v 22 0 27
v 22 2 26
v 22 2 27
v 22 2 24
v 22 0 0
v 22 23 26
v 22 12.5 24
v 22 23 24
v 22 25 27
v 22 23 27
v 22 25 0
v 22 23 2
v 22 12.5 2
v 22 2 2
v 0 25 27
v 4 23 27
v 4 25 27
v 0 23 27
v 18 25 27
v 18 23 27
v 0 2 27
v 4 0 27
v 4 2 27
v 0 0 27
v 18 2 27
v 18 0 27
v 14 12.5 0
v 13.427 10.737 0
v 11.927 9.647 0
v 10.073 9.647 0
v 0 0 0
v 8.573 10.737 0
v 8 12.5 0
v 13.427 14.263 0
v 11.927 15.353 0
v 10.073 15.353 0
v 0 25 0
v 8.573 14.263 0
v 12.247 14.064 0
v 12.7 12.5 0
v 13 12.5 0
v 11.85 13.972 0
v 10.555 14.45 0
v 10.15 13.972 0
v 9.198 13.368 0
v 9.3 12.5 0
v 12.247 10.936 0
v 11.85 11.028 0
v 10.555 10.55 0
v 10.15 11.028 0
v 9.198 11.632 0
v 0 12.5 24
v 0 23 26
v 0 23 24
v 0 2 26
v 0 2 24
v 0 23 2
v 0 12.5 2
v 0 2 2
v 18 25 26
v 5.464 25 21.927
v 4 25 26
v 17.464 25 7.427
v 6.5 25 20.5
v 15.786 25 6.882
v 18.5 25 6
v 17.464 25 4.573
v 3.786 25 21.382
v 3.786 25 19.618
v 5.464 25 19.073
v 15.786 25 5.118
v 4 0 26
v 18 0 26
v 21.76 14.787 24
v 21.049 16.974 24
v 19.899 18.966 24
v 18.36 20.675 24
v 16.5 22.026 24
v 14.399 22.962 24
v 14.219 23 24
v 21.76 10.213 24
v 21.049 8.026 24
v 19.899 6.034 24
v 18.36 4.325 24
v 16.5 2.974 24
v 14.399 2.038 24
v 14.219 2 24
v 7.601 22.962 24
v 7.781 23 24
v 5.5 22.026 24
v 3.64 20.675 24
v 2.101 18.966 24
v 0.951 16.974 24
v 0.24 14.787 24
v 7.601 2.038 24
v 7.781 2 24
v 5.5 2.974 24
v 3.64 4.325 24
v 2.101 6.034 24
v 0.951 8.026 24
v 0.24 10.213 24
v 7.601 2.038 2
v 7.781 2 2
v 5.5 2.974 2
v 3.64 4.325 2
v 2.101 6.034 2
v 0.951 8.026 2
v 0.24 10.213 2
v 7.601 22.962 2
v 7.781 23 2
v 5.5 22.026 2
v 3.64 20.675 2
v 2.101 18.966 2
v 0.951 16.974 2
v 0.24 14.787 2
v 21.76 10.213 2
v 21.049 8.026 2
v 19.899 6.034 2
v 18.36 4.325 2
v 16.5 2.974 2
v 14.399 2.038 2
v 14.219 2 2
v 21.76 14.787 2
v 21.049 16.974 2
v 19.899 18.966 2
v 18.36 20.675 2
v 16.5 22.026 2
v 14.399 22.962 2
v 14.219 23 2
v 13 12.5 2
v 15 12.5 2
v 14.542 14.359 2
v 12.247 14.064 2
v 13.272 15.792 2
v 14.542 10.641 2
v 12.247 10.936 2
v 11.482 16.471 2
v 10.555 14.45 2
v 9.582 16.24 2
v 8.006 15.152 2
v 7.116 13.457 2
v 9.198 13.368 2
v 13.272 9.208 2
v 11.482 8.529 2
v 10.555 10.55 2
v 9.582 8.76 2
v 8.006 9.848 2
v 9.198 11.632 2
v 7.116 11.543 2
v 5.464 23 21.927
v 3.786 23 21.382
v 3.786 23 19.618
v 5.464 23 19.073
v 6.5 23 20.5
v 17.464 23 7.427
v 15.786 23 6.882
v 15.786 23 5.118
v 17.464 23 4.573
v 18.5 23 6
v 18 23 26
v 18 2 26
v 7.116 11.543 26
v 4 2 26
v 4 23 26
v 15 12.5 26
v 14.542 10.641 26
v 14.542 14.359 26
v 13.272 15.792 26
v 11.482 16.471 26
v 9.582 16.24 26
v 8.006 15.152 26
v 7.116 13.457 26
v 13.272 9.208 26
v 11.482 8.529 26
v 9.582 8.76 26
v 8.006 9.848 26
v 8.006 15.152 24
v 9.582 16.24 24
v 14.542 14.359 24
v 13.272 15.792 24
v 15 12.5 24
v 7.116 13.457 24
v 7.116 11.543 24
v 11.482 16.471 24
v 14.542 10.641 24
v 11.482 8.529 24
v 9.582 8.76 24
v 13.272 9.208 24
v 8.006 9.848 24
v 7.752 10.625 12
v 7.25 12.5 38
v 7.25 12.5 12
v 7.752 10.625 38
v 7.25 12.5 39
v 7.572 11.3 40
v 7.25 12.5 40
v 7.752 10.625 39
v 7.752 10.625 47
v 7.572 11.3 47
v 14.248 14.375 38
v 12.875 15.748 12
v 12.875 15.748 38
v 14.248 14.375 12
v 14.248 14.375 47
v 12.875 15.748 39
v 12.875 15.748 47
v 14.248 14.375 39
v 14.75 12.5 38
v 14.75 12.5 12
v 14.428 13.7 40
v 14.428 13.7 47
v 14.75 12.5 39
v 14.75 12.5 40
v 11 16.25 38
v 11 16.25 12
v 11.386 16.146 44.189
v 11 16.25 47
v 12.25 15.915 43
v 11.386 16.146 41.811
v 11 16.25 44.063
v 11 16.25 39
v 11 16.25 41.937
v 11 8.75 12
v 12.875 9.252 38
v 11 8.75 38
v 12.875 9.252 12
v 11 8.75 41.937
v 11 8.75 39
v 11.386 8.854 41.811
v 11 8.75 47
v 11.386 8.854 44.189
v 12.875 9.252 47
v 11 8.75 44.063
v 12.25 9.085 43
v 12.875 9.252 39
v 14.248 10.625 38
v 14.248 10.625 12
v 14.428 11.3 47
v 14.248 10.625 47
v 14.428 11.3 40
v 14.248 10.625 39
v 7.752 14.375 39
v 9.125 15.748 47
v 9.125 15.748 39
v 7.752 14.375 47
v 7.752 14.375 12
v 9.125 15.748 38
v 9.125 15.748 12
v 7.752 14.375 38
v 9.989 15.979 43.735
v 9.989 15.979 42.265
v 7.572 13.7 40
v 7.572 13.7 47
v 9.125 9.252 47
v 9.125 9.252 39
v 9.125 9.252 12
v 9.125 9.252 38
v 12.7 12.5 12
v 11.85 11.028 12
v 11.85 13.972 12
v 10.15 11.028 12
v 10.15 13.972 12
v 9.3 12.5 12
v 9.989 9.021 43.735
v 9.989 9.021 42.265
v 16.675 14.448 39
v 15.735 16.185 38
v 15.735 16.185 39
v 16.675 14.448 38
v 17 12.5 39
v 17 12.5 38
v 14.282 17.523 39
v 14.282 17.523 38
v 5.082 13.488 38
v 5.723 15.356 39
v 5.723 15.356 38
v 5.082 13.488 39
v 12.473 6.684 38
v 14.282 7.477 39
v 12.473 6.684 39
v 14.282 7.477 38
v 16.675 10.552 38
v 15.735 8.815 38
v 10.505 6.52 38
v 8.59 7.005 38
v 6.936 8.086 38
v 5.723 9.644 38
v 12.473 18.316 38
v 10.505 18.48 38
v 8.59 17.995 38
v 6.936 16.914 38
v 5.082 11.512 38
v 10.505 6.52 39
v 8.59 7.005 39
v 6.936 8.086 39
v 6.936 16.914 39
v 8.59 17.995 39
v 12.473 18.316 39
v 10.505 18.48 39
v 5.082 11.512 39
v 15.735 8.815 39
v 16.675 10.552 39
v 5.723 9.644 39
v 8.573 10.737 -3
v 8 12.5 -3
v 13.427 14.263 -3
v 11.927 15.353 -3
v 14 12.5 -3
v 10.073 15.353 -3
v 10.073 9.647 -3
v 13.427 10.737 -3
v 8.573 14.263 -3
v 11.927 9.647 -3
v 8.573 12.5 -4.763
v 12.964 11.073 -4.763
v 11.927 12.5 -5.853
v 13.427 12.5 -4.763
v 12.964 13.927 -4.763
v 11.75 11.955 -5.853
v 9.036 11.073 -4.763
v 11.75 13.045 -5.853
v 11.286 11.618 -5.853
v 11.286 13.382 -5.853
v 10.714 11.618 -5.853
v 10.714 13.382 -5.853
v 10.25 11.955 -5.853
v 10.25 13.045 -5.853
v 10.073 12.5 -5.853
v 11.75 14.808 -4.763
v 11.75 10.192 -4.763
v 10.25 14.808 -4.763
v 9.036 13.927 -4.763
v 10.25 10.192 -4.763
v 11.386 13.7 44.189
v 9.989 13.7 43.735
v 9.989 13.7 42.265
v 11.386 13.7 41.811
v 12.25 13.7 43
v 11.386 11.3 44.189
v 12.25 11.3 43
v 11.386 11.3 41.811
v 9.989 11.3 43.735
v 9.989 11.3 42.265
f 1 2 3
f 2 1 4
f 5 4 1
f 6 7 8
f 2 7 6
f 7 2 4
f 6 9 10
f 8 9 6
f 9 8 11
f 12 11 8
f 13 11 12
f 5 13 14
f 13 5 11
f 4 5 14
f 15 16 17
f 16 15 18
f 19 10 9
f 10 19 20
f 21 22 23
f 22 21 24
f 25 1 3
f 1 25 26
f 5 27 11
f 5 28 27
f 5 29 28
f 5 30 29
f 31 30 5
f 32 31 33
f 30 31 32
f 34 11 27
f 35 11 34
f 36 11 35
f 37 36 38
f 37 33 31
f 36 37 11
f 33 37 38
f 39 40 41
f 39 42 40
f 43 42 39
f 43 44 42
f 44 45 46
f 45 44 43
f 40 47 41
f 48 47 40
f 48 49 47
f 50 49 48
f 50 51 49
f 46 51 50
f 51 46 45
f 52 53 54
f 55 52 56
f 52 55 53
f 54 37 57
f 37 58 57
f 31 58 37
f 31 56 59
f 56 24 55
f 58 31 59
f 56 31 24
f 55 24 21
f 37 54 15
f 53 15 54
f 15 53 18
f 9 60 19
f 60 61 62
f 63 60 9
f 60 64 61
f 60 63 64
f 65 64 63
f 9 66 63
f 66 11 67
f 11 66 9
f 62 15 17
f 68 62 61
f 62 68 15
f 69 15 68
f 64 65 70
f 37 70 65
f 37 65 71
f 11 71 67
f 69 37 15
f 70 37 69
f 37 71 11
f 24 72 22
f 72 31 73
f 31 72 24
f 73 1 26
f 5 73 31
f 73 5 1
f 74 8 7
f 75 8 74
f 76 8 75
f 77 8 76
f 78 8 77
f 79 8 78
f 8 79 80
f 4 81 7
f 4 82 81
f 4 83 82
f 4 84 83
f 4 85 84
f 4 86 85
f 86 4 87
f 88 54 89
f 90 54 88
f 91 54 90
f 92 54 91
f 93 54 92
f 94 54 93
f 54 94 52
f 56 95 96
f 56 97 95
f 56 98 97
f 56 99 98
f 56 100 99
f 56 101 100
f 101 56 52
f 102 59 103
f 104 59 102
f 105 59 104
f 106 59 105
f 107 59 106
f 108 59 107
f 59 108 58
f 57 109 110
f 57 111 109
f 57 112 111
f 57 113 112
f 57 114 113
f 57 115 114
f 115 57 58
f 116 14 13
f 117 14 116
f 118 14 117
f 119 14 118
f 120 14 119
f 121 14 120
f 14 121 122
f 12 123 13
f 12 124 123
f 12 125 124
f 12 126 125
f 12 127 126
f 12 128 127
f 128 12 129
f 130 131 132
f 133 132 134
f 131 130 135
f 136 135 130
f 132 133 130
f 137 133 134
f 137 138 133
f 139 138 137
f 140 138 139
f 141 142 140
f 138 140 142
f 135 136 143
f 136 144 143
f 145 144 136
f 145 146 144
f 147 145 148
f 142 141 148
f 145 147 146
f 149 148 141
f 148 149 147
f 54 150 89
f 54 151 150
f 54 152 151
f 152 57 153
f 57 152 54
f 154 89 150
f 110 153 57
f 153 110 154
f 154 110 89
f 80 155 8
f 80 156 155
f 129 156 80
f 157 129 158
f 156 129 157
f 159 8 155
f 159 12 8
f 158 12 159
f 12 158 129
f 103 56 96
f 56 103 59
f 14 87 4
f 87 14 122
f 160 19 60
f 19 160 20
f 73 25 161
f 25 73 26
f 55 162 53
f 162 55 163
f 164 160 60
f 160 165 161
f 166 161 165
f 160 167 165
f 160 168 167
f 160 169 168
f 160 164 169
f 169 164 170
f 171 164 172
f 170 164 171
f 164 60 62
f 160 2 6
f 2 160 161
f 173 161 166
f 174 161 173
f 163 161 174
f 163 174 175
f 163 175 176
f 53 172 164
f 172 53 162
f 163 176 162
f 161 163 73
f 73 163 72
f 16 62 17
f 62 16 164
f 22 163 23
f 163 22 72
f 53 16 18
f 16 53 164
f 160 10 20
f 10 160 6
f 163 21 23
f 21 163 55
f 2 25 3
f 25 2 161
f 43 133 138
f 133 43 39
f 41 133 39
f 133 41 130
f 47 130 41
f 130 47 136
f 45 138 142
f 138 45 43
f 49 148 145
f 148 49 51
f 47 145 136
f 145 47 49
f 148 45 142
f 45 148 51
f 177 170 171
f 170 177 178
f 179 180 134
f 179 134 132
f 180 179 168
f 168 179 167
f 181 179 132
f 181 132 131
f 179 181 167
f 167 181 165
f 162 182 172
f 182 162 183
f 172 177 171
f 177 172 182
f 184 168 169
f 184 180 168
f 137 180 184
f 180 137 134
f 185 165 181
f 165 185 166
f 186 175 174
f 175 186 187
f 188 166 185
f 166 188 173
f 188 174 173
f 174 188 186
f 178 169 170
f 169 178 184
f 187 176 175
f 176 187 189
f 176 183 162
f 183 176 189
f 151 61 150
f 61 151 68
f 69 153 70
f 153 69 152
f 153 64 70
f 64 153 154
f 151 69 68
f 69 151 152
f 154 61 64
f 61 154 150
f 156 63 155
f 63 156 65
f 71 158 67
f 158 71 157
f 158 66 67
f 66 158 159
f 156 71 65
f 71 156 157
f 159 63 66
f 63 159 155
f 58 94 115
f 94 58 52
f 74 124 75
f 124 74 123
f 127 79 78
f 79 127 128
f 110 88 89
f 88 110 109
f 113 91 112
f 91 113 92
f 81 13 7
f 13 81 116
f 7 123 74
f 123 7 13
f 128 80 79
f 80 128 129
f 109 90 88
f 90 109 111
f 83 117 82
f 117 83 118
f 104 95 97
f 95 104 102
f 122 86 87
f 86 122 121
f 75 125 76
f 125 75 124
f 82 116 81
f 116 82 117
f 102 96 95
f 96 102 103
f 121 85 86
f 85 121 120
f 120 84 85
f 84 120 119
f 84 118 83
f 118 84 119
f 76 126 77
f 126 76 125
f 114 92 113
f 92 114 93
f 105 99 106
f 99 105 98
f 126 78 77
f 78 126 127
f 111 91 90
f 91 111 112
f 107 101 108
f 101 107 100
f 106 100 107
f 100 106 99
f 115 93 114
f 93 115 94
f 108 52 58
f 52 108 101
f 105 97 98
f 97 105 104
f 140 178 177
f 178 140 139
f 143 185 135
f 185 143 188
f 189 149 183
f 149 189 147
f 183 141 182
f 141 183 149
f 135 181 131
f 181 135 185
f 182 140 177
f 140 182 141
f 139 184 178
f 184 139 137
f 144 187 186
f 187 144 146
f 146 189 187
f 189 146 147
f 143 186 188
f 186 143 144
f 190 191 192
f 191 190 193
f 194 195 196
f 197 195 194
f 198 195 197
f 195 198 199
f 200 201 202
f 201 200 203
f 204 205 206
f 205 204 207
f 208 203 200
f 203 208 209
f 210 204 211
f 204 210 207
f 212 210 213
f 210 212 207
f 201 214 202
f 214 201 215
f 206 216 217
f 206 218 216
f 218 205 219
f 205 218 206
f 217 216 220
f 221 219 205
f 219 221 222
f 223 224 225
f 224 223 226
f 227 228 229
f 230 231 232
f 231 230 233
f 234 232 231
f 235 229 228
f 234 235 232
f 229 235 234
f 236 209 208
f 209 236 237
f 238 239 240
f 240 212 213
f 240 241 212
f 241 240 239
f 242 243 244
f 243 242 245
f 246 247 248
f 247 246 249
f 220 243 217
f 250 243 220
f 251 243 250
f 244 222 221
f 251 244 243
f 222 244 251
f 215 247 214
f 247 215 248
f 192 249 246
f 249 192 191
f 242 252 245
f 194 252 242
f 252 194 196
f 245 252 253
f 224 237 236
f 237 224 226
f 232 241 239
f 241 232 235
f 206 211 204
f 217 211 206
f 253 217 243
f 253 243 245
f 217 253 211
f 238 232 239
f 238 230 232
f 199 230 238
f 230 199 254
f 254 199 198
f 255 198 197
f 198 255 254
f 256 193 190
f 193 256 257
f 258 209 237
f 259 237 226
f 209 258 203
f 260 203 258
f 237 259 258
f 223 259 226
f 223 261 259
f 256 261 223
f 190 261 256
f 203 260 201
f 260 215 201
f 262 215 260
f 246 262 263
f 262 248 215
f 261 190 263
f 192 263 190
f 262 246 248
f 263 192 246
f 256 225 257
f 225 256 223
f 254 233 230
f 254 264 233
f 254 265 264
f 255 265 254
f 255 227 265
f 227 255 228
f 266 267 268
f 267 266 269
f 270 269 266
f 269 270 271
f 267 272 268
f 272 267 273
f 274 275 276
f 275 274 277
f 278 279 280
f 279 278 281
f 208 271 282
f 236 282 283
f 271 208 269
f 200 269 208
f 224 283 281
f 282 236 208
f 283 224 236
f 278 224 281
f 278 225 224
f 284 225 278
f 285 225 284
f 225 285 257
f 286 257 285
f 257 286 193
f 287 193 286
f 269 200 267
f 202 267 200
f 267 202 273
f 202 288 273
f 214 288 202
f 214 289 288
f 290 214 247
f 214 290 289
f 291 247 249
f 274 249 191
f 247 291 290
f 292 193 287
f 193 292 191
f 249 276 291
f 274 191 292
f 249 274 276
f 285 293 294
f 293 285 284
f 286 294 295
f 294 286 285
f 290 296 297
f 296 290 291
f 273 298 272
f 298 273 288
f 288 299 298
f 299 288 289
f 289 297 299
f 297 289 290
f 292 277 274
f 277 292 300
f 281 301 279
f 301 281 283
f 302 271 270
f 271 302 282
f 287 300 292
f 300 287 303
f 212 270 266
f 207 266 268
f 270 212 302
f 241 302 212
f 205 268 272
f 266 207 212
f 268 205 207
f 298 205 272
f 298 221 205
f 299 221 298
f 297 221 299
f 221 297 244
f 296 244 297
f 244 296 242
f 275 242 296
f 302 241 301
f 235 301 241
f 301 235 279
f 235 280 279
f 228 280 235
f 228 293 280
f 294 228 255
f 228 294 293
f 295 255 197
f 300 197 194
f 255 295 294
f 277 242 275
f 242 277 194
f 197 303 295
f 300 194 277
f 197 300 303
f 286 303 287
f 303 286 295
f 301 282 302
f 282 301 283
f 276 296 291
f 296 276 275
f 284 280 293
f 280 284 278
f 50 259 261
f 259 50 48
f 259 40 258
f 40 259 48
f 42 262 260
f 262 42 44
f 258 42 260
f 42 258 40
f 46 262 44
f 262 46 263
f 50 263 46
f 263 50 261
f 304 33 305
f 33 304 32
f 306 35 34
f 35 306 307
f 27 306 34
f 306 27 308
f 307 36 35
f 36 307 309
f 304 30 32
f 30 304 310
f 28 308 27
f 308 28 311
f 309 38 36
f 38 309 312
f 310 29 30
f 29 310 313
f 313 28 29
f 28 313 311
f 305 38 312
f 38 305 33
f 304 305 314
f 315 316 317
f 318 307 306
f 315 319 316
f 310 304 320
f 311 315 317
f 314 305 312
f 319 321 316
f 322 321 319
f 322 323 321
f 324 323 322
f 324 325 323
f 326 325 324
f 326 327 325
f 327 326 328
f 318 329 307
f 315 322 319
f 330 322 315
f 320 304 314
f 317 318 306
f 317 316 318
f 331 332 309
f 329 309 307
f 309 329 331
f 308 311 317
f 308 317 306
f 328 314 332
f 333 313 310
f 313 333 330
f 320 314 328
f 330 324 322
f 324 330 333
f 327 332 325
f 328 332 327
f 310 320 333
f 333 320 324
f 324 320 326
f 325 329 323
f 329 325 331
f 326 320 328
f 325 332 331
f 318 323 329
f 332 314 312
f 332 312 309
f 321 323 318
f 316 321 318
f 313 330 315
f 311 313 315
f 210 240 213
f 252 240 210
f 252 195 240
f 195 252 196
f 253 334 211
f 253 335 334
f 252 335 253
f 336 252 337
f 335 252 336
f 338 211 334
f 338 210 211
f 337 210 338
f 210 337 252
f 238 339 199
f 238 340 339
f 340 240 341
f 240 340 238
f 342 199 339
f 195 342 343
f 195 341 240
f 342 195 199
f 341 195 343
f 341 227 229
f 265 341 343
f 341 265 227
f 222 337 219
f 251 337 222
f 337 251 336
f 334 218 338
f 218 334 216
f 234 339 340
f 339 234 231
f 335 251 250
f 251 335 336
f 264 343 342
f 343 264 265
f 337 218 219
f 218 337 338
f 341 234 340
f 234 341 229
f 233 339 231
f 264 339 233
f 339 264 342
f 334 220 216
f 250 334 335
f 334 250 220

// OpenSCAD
solenoid();

module solenoid(position=0,type="JF0826B"){
    if(type=="JF0826B"){
        location = 12 - position * 10;
        color("silver") 
        difference(){
            cube([22,25,27]);
            translate([-1,2,2]) cube([24,21,22]);
            translate([4,-1,26]) cube([14,27,2]);
            translate([-1,2,26]) cube([24,21,2]);
            translate([11,12.5,-1]) cylinder(r=2,h=4);
            translate([11,12.5,3]) cylinder(r=4,h=27);
            translate([5,12.5,20.5]) 
                    rotate([-90,0,0]) cylinder(r=1.5,h=15);
            translate([17,12.5,6]) 
                    rotate([-90,0,0]) cylinder(r=1.5,h=15);
        }
        color("blue") translate([11,12.5,2]) difference(){
            cylinder(r=11,h=22);
            translate([0,0,-1]) cylinder(r=4,h=29);
        }
        color("silver") translate([11,12.5,location]) difference(){
        union(){
                cylinder(r=3.75,h=35);
                translate([0,0,26]) cylinder(r=6,h=1);
                translate([0,0,-15]) cylinder(r=1.7,h=16);
                translate([0,0,-15]) cylinder(r=3,h=3);
                translate([0,0,-15]) sphere(3);
            }
            translate([-5,-1.2,28]) cube([10,2.4,10]);
            translate([0,5,31]) rotate([90,0,0]) cylinder(r=1.25,h=10);
        }
    }
}
